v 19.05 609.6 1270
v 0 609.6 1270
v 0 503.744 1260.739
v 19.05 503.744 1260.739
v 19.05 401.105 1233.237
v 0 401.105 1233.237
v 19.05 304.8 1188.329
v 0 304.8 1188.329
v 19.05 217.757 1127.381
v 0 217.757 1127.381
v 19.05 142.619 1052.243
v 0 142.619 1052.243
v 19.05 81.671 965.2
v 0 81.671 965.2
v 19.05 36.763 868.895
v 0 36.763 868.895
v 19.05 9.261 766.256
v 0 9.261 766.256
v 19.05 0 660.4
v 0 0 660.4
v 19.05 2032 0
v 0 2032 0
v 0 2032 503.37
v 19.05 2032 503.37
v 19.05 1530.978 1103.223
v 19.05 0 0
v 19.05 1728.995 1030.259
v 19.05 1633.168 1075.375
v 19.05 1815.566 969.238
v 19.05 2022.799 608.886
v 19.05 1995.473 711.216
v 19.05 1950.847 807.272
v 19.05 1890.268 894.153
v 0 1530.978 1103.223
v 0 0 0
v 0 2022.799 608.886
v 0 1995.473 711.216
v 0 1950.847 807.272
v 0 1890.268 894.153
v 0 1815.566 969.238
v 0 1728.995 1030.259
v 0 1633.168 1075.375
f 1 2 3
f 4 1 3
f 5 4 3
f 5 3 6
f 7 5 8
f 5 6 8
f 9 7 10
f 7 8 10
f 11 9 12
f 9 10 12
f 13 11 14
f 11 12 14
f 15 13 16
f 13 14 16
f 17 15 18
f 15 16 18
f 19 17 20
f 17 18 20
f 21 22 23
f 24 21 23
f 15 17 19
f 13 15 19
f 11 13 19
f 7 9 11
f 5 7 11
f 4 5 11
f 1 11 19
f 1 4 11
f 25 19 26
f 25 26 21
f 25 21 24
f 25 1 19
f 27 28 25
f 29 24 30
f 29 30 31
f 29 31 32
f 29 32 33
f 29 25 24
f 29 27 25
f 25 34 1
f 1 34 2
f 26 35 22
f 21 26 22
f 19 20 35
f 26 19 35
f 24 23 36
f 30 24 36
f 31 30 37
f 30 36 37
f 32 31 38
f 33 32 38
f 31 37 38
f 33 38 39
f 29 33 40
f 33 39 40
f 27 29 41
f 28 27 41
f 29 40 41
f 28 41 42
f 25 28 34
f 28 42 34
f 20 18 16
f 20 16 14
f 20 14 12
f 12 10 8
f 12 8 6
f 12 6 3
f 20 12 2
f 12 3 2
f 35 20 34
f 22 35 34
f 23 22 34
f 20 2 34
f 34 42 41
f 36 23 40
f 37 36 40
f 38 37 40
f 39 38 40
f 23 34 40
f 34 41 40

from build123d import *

# Parameters (mm, degrees)
F1_DEPTH = 19.05


with BuildPart() as f1:
    # F0 (on Right) → F1 (new body)
    with BuildSketch(Plane.YZ):
        with BuildLine():
            Line((0, 660.4), (0, 0))
            Line((0, 0), (2032, 0))
            Line((2032, 0), (2032, 503.370324))
            ThreePointArc((2032, 503.370324), (1890.268319, 894.153379), (1530.978359, 1103.222722))
            Line((1530.978359, 1103.222722), (609.6, 1270))
            ThreePointArc((609.6, 1270), (178.547706, 1091.452294), (0, 660.4))
        make_face()
    extrude(amount=F1_DEPTH)


solid = f1.part
